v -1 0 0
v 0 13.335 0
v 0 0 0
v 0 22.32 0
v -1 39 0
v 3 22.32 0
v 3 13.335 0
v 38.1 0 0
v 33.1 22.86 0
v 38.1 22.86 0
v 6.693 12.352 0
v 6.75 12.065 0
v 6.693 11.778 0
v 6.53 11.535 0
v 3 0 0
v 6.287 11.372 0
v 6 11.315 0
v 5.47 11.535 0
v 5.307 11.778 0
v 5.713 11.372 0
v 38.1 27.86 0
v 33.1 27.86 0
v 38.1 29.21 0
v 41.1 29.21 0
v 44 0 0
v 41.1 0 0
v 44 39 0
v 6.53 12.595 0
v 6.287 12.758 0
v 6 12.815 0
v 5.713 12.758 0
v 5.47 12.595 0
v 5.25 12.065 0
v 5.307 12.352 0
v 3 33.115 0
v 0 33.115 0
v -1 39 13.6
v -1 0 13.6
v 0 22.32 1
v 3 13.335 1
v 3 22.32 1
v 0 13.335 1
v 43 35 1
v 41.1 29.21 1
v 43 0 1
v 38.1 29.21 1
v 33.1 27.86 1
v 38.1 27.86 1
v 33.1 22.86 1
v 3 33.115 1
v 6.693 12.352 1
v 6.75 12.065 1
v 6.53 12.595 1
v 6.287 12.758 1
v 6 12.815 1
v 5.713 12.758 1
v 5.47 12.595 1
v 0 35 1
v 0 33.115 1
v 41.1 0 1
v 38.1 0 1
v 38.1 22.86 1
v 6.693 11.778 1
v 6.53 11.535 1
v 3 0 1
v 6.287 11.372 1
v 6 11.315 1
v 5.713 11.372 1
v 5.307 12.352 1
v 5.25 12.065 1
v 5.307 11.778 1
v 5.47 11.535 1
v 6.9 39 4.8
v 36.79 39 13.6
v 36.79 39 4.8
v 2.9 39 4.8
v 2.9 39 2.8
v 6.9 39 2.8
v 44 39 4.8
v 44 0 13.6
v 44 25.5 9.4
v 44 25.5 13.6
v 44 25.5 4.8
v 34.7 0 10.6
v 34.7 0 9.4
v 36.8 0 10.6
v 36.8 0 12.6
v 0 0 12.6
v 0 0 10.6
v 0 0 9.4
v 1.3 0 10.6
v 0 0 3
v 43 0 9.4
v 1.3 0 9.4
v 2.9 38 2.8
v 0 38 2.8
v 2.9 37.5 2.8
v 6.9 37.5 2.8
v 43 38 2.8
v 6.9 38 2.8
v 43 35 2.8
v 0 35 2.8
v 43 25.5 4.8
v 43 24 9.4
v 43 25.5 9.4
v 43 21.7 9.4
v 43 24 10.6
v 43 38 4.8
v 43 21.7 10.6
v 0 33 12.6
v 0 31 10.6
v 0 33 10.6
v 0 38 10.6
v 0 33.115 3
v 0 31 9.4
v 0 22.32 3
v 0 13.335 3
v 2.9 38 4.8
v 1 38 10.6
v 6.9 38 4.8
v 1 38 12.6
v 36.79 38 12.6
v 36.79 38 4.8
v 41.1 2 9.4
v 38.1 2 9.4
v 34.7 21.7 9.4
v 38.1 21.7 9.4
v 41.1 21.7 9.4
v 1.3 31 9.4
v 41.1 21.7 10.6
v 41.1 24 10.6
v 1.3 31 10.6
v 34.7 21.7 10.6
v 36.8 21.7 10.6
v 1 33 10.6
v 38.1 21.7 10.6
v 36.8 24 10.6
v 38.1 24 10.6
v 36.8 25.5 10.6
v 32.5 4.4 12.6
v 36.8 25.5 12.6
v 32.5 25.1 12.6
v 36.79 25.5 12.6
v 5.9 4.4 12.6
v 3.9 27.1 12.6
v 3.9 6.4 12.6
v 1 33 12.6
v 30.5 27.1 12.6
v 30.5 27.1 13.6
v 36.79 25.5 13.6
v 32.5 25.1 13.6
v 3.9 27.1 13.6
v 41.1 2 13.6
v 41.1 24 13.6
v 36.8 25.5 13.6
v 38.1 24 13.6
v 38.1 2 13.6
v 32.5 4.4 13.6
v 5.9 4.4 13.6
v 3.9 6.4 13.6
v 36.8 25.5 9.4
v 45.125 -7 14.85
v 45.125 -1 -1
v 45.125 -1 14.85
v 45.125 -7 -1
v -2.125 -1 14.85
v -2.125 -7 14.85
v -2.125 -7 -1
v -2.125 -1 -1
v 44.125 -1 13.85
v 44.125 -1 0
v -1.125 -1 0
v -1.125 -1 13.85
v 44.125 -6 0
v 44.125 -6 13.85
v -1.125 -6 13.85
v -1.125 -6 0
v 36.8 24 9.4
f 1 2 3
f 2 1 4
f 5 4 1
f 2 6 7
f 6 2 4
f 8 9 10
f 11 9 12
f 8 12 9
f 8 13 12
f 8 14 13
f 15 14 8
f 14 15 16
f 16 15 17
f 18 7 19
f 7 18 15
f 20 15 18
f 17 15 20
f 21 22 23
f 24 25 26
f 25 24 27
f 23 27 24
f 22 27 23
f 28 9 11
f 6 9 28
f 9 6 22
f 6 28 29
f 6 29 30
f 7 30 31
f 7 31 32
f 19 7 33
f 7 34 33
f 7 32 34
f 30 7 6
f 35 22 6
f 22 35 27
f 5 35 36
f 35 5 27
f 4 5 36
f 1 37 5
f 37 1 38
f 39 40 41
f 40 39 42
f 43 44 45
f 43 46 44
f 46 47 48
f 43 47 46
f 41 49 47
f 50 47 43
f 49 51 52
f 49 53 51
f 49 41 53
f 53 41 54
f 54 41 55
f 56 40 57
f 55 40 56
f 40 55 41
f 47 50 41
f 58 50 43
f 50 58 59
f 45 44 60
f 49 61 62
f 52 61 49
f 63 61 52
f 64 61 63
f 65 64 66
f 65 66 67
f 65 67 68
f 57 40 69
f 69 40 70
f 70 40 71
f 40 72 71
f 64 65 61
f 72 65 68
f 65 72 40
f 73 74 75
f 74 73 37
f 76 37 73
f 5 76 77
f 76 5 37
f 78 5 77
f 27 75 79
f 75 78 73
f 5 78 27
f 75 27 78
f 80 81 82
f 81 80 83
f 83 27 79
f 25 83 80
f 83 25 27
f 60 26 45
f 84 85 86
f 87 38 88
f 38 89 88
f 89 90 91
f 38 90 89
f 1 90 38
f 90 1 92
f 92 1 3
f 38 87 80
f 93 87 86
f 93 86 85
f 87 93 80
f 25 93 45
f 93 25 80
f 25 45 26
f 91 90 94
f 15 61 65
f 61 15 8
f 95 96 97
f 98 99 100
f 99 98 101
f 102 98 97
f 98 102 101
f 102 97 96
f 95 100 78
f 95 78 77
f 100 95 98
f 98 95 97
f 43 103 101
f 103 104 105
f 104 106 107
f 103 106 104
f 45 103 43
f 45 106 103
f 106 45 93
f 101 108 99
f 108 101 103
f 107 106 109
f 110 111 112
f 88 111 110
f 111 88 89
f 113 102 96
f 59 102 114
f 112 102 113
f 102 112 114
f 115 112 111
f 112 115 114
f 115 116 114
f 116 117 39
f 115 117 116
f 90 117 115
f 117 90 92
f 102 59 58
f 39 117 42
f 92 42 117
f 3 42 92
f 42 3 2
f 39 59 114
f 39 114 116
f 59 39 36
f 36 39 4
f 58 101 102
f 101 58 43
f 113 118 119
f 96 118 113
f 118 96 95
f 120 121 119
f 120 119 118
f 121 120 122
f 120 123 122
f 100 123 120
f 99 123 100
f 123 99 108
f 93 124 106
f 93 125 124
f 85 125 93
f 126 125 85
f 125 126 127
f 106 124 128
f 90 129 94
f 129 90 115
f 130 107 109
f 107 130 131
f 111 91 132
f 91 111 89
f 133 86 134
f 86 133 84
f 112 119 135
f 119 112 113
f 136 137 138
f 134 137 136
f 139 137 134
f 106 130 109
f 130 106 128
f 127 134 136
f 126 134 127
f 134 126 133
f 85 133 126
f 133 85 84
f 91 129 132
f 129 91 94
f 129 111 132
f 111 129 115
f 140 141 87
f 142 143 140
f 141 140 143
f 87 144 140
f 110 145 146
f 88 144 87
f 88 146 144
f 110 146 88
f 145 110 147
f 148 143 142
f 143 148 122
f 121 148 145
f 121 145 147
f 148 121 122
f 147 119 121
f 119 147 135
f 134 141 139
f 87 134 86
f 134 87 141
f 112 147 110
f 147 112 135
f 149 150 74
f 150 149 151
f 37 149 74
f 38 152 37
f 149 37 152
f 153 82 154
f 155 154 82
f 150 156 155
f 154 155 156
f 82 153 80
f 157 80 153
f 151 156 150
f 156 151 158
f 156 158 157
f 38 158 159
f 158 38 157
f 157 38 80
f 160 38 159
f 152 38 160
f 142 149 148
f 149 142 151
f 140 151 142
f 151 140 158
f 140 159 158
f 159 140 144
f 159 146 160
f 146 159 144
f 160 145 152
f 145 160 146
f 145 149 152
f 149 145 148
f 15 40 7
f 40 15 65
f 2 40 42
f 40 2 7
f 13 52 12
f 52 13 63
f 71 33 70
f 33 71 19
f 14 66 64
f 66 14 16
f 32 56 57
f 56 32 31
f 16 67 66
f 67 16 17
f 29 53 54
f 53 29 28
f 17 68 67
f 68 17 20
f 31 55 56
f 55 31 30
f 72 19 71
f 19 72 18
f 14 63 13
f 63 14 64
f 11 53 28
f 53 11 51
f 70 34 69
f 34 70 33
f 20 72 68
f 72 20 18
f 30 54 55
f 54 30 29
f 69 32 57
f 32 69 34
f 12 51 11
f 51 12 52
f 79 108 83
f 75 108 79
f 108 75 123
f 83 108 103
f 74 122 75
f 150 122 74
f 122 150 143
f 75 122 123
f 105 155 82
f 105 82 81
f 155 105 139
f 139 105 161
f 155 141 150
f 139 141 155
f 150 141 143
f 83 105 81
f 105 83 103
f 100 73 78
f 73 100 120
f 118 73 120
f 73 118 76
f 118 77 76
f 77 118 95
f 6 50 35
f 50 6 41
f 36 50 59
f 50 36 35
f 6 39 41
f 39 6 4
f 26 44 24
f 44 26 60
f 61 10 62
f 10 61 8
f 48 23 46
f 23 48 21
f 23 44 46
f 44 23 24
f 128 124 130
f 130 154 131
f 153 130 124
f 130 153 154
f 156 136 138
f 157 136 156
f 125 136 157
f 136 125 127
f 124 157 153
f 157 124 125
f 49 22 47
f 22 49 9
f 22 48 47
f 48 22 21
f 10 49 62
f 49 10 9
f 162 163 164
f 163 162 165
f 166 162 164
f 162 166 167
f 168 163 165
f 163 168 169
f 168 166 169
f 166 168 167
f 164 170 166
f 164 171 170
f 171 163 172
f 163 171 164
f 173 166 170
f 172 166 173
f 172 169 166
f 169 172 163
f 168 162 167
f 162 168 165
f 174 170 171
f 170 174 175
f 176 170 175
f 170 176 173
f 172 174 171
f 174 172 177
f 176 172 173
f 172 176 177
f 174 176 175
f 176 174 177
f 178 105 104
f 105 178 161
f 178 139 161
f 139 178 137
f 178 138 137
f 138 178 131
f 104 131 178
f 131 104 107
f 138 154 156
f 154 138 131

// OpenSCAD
/**************************************************/
/*  This is a model of case for LimiFrog 0.2      */
/*  (the version shipped to Kickstarter backers)  */
/*                                                */
/* It is intended for a stacked configuration,    */
/* the battery lies between the board and the     */
/* display                                        */
/* The user may choose to enable/disable the      */
/* generation of some geometries (typically,      */
/* openings for connectors) by commenting out some*/
/* sections of this code.                         */
/* Wall thickness can also be configured.         */
/**************************************************/

/**************************************************/
/* The XY plane is parallel to the display,       */
/* Z axis is normal to the display.               */
/*                                                */
/* Code does the following:                       */
/* - describe 7 stacked "slices" along XY plane   */
/*   Each slice is described in 2D then extruded  */
/*    along Z axis                                */
/* - then add openings for the VL6180X sensor,    */
/*   for the microphone, for the extension port,  */
/*   for the program & debug connectros etc.      */
/* - finally lid is described                     */
/**************************************************/


/* == Construction Parameters  ===================*/ 

// You may want to change the following
Twall = 1;      // Wall thickness
Twall_lid = 1;  // Lid wall thickness 


// Better not change this unless you know what 
// you're doing

epsilon = 0.5;

Xboard=42.4; // real size 42.4 , will add some margin when computing Xin
Yboard=35;   // real size 34.6 + some margin

Yflex = 3;   // to accomodate curve of flexible connector from board to display

// Internal dimensions of the case :
Xin = Xboard + 0.6;  
Yin = Yboard + Yflex;

// Screen (i.e. display) dimensions + slight margin
// (real dimensions @ no margin = 35.8x30.8)
Xscreen = 36; 
Yscreen=31; 

// (X-)Margin that allows display to slide within the guide
ScreenMargin = 0.8;

// Distance between holes for extension port
// and holes for STM32/BME SWD ports
LR_Connectors_Dist = 15*2.54;


// Slice 1 parameters
h1 = 1; // = thickness of box bottom

// Slice 2 parameters
h2 = 1+0.8; // = thickness of PCB + bottom-side components

// Slice 3 parameters
h3 = 2; // = max thickness of top components

// Slice 4 parameters
h4 = 4.6; // = max battery thickness
// Side battery blockers suppressed

// Slice 5 parameters
h5 = 1.2; // = thickness of OLED supports (rails) - also allows to squeeze battery wires

// Dimesion of the rails over which the OLED display
// is expected to slide
X_OledSupport = 1.3;
Y_OledSupport_left = Yscreen;
Y_OledSupport_right = Yscreen*0.7;

// Slice 6 parameters
h6 = 1.7+0.3; // = thickness of OLED + slight margin
Ybutee = 5; Xbutee = 1; //dimensions of stop part that prevents OLED to slide too far inside the case
 
// Slice 7 parameters
h7 = Twall; // = thickness of box top
// dimensions of active region of the display:
Xdisplay_active = 28.6; 
Ydisplay_active = 22.7; 
// Translation factors to get the case opening to match the position of the display's active region
Display_LeftMargin = 3.9; 
Display_TopMargin = 5.9; 

// Parameters for openings for VL6180X and mic
Y_VL6180X_CornerOpen= 9.5+Yflex; 
Mic_opening_Xleft = 2.9;
Mic_opening_Xright =6.9;
Mic_opening_Z = 2;



/* == Now actually describe the case =============*/ 

// Generic module re-used multiple times below
module shell_TopView()
{
    difference()
    {
        translate([-Twall,0,0])
        square([Xin+2*Twall, Yin+Twall]);
        
        square([Xin, Yin]);
    }
}


// ----------------------------------------------
// Slice 1 (bottom of box)
module slice1_TopView()
{
        translate([-Twall,0,0])
        square([Xin+2*Twall, Yin+Twall]);
}
    
module slice1()
{
    linear_extrude(height=h1)slice1_TopView();
}
    

// ----------------------------------------------
// Slice 2 -- PCB + bottom components padding
module slice2_TopView()
{
    difference()
    {
        translate([-Twall,0,0])
        square([Xin+2*Twall, Yin+Twall]);
        
        square([Xin, Yboard]);
    }
}
module slice2()
{
    linear_extrude(height=h2)
        slice2_TopView();
}
    

// ----------------------------------------------
// Slice 3 -- Top components + some margin
module slice3_TopView()
{
    shell_TopView();
}
module slice3()
{
    linear_extrude(height=h3)
        slice3_TopView();
}
    

// ----------------------------------------------
// Slice 4 -- Battery side 
module slice4_TopView()
{
    shell_TopView();
 // no side blockers anymore
}
module slice4()
{
    linear_extrude(height=h4)
        slice4_TopView();
}
    

// ----------------------------------------------
// Slice 5 -- OLED support (rails)
module slice5_TopView()
{
    shell_TopView();
    square([X_OledSupport, Y_OledSupport_left]); 
    translate([Xscreen-X_OledSupport,0,0])
      square([Xin-Xscreen+X_OledSupport, Y_OledSupport_right]);
}
module slice5()
{
    linear_extrude(height=h5)
        slice5_TopView();
}
    
// ----------------------------------------------
// Slice 6 -- OLED guide (rails)
module slice6_TopView()
{
    difference()
    {
        translate([-Twall,0,0])
        square([Xin+2*Twall, Yin+Twall]);
        
        square([Xscreen+ScreenMargin, Yin]);
     /* ONLY IF NO TOP OPENING ON EXT PORT :   
        //Also,  remove material for cost optimisation :
        translate([Xscreen+ScreenMargin, 3, 0])
            square([Xin-(Xscreen+ScreenMargin),3]);
        translate([Xscreen+ScreenMargin, 9, 0])
            square([Xin-(Xscreen+ScreenMargin),3]);
        translate([Xscreen+ScreenMargin, 15, 0])
            square([Xin-(Xscreen+ScreenMargin),3]);
     */
    }
    
  translate([0, Yin-Ybutee, 0])
    square([Xbutee, Ybutee]);
    
}
module slice6()
{
    linear_extrude(height=h6)
        slice6_TopView();
}
    

// ----------------------------------------------
// Slice 7 -- box top with opening
module slice7_TopView()
{
    difference()
    {
        translate([-Twall,0,0])
        square([Xin+2*Twall, Yin+Twall]);
        
        translate([Display_LeftMargin, 
        Yin-(Ybutee+Display_TopMargin+Ydisplay_active),0])
        square([Xdisplay_active, Ydisplay_active]);
    }
    
    // "Fill" 2 opposite corners for aesthetic & robustness
    Screen_TopRightX = Display_LeftMargin+Xdisplay_active;
    Screen_TopRightY = Yin-(Ybutee+Display_TopMargin);
    Screen_BotLeftX = Display_LeftMargin;
    Screen_BotLeftY = Yin-(Ybutee+Display_TopMargin+Ydisplay_active);

    polygon(points=[ [Screen_TopRightX,Screen_TopRightY],
                     [Screen_TopRightX-2,Screen_TopRightY],
                     [Screen_TopRightX,Screen_TopRightY-2] 
                    ]);
    polygon(points=[ [Screen_BotLeftX,Screen_BotLeftY],
                     [Screen_BotLeftX+2,Screen_BotLeftY],
                     [Screen_BotLeftX,Screen_BotLeftY+2] 
                    ]);

}
module slice7()
{
    linear_extrude(height=h7)
        slice7_TopView();
}
    

// ----------------------------------------------
// Assemble the above slices into complete case :

module box_tmp()
{
  union()
  {
    slice1();
    
    translate([0, 0, h1])
    slice2();

    translate([0, 0, h1+h2])
    slice3();
    
    translate([0, 0, h1+h2+h3])
    slice4();

    translate([0, 0, h1+h2+h3+h4])
    slice5();

    translate([0, 0, h1+h2+h3+h4+h5])
    slice6();

    translate([0, 0, h1+h2+h3+h4+h5+h6])
    slice7();
  }
}



/* == Add various openings to the case   ==========*/ 


module VL6180X_CornerCut()
{
    translate([Xscreen+ScreenMargin-0.01, Yin-Y_VL6180X_CornerOpen, h1+h2+h3]) 
      cube([Xin+Twall-(Xscreen+ScreenMargin)+epsilon, Y_VL6180X_CornerOpen+Twall+epsilon, h7+h6+h5+h4]);
}



module Mic_Opening()
{
  translate([Mic_opening_Xleft, Yin-epsilon, h1+h2])
     cube([Mic_opening_Xright-Mic_opening_Xleft, Twall+2*epsilon , Mic_opening_Z]);
}


module stm32SWD_Opening() //but posn5 (Boot0) not accessible
{
   X_hole = 3;
   Y_hole = 5*2.54 + 2.54/4;  // header pitch=2.54 mm
   translate([0,0,-2])
      cube([X_hole,Y_hole,5]);
    
   // Mark position 1
   translate([6, Y_hole-2.54/2, -2]) 
     linear_extrude(height=5)
      circle(d=1.5, $fn=16);
      
}

module bleSWD_Opening()
{
   X_hole = 3;
   Y_hole = 4*2.54+2.54/4;  // header pitch=2.54 mm
   translate([0,2+8*2.54,-2])
      cube([X_hole,Y_hole,5]);
}

module ExtensionPins_Opening() 
{
   X_hole = 3;
   Y_hole = 10*2.54 + 2.54 + 2.54/2;  // header pitch=2.54 mm
   translate([LR_Connectors_Dist, 0, -2]) 
     cube([X_hole,Y_hole,5]);
}

module ResetButton_Opening() 
{
   X_RstBut = 5;
   Y_RstBut = 5;  
   translate([LR_Connectors_Dist-X_RstBut, 9*2.54, -2])
     cube([X_RstBut,Y_RstBut,5]);
}

module ExtensionPins_TopOpening() 
{
   X_hole = 3;
   Y_hole = 10*2.54 + 2.54 + 2.54/2 -2;  
    
    translate([LR_Connectors_Dist, 2, h1+h2+h3+h4])
   cube([X_hole,Y_hole,5]);

}

module SideOfTopOpening()
{
    SideThickness = 1.5;
    
    translate([Xscreen+ScreenMargin, Yin-Y_VL6180X_CornerOpen-SideThickness, h1+h2+h3+h4])
    cube([ Xin+Twall-(Xscreen+ScreenMargin), SideThickness, h7+h6+h5 ]);
}
SideOfTopOpening();


// We are doing the actual openings here
// You may comment out those you don't want

module box()
{
union()
{
  difference()
  {
    box_tmp();
    
    VL6180X_CornerCut();
    Mic_Opening();
    stm32SWD_Opening();
    bleSWD_Opening();
    ExtensionPins_Opening();
    ExtensionPins_TopOpening();
    ResetButton_Opening();
  }  
  
  }
}

box();


/* == Now the LID  ============================*/ 

small_delta=0.25; //was 0.3
Xlid_in = Xin+2*Twall + small_delta;
Ylid_in = 5;
Zlid_in = h1+h2+h3+h4+h5+h6+h7 + small_delta;

Xlid_out = Xlid_in+2*Twall_lid;
Ylid_out = Ylid_in +Twall_lid;
Zlid_out = Zlid_in+2*Twall_lid;


lid_shift = 1;
module lid()
{
difference()
    {
      translate( [-Twall-Twall_lid, -Twall_lid, -Twall_lid] )
        cube([Xlid_out, Ylid_out, Zlid_out]);   
       
      translate( [-Twall, 0, 0] )
        cube([Xlid_in, Ylid_in, Zlid_in]);   
    }
}


translate([-small_delta/2,-(Ylid_in+lid_shift),0])
  lid();


/* The following code joins the lid and the box   */
/* by a thin part that would be cut off after 3D  */
/* printing. This is only to allow the box and    */
/* the lid to be printed as a single part at      */
/* e.g Sculpteo                                   */
/* This option is OFF by default                  */

/*

Tlink=0.8; // minimum thickness for 3D printer
Wlink = h2+h3+h4+h5+h6;
module link()
{
  translate([0,0,h1])
    linear_extrude (height=Wlink)
      polygon(points=[
       [-Twall,0],
       [-Twall-Twall_lid,-lid_shift],
       [-Twall-Twall_lid+Tlink, -lid_shift], 
       [-Twall+Tlink,0] ] );
}

link();
translate([-Twall+Xin+Twall ,0,0])
  mirror([1,0,0]) link();

*/
